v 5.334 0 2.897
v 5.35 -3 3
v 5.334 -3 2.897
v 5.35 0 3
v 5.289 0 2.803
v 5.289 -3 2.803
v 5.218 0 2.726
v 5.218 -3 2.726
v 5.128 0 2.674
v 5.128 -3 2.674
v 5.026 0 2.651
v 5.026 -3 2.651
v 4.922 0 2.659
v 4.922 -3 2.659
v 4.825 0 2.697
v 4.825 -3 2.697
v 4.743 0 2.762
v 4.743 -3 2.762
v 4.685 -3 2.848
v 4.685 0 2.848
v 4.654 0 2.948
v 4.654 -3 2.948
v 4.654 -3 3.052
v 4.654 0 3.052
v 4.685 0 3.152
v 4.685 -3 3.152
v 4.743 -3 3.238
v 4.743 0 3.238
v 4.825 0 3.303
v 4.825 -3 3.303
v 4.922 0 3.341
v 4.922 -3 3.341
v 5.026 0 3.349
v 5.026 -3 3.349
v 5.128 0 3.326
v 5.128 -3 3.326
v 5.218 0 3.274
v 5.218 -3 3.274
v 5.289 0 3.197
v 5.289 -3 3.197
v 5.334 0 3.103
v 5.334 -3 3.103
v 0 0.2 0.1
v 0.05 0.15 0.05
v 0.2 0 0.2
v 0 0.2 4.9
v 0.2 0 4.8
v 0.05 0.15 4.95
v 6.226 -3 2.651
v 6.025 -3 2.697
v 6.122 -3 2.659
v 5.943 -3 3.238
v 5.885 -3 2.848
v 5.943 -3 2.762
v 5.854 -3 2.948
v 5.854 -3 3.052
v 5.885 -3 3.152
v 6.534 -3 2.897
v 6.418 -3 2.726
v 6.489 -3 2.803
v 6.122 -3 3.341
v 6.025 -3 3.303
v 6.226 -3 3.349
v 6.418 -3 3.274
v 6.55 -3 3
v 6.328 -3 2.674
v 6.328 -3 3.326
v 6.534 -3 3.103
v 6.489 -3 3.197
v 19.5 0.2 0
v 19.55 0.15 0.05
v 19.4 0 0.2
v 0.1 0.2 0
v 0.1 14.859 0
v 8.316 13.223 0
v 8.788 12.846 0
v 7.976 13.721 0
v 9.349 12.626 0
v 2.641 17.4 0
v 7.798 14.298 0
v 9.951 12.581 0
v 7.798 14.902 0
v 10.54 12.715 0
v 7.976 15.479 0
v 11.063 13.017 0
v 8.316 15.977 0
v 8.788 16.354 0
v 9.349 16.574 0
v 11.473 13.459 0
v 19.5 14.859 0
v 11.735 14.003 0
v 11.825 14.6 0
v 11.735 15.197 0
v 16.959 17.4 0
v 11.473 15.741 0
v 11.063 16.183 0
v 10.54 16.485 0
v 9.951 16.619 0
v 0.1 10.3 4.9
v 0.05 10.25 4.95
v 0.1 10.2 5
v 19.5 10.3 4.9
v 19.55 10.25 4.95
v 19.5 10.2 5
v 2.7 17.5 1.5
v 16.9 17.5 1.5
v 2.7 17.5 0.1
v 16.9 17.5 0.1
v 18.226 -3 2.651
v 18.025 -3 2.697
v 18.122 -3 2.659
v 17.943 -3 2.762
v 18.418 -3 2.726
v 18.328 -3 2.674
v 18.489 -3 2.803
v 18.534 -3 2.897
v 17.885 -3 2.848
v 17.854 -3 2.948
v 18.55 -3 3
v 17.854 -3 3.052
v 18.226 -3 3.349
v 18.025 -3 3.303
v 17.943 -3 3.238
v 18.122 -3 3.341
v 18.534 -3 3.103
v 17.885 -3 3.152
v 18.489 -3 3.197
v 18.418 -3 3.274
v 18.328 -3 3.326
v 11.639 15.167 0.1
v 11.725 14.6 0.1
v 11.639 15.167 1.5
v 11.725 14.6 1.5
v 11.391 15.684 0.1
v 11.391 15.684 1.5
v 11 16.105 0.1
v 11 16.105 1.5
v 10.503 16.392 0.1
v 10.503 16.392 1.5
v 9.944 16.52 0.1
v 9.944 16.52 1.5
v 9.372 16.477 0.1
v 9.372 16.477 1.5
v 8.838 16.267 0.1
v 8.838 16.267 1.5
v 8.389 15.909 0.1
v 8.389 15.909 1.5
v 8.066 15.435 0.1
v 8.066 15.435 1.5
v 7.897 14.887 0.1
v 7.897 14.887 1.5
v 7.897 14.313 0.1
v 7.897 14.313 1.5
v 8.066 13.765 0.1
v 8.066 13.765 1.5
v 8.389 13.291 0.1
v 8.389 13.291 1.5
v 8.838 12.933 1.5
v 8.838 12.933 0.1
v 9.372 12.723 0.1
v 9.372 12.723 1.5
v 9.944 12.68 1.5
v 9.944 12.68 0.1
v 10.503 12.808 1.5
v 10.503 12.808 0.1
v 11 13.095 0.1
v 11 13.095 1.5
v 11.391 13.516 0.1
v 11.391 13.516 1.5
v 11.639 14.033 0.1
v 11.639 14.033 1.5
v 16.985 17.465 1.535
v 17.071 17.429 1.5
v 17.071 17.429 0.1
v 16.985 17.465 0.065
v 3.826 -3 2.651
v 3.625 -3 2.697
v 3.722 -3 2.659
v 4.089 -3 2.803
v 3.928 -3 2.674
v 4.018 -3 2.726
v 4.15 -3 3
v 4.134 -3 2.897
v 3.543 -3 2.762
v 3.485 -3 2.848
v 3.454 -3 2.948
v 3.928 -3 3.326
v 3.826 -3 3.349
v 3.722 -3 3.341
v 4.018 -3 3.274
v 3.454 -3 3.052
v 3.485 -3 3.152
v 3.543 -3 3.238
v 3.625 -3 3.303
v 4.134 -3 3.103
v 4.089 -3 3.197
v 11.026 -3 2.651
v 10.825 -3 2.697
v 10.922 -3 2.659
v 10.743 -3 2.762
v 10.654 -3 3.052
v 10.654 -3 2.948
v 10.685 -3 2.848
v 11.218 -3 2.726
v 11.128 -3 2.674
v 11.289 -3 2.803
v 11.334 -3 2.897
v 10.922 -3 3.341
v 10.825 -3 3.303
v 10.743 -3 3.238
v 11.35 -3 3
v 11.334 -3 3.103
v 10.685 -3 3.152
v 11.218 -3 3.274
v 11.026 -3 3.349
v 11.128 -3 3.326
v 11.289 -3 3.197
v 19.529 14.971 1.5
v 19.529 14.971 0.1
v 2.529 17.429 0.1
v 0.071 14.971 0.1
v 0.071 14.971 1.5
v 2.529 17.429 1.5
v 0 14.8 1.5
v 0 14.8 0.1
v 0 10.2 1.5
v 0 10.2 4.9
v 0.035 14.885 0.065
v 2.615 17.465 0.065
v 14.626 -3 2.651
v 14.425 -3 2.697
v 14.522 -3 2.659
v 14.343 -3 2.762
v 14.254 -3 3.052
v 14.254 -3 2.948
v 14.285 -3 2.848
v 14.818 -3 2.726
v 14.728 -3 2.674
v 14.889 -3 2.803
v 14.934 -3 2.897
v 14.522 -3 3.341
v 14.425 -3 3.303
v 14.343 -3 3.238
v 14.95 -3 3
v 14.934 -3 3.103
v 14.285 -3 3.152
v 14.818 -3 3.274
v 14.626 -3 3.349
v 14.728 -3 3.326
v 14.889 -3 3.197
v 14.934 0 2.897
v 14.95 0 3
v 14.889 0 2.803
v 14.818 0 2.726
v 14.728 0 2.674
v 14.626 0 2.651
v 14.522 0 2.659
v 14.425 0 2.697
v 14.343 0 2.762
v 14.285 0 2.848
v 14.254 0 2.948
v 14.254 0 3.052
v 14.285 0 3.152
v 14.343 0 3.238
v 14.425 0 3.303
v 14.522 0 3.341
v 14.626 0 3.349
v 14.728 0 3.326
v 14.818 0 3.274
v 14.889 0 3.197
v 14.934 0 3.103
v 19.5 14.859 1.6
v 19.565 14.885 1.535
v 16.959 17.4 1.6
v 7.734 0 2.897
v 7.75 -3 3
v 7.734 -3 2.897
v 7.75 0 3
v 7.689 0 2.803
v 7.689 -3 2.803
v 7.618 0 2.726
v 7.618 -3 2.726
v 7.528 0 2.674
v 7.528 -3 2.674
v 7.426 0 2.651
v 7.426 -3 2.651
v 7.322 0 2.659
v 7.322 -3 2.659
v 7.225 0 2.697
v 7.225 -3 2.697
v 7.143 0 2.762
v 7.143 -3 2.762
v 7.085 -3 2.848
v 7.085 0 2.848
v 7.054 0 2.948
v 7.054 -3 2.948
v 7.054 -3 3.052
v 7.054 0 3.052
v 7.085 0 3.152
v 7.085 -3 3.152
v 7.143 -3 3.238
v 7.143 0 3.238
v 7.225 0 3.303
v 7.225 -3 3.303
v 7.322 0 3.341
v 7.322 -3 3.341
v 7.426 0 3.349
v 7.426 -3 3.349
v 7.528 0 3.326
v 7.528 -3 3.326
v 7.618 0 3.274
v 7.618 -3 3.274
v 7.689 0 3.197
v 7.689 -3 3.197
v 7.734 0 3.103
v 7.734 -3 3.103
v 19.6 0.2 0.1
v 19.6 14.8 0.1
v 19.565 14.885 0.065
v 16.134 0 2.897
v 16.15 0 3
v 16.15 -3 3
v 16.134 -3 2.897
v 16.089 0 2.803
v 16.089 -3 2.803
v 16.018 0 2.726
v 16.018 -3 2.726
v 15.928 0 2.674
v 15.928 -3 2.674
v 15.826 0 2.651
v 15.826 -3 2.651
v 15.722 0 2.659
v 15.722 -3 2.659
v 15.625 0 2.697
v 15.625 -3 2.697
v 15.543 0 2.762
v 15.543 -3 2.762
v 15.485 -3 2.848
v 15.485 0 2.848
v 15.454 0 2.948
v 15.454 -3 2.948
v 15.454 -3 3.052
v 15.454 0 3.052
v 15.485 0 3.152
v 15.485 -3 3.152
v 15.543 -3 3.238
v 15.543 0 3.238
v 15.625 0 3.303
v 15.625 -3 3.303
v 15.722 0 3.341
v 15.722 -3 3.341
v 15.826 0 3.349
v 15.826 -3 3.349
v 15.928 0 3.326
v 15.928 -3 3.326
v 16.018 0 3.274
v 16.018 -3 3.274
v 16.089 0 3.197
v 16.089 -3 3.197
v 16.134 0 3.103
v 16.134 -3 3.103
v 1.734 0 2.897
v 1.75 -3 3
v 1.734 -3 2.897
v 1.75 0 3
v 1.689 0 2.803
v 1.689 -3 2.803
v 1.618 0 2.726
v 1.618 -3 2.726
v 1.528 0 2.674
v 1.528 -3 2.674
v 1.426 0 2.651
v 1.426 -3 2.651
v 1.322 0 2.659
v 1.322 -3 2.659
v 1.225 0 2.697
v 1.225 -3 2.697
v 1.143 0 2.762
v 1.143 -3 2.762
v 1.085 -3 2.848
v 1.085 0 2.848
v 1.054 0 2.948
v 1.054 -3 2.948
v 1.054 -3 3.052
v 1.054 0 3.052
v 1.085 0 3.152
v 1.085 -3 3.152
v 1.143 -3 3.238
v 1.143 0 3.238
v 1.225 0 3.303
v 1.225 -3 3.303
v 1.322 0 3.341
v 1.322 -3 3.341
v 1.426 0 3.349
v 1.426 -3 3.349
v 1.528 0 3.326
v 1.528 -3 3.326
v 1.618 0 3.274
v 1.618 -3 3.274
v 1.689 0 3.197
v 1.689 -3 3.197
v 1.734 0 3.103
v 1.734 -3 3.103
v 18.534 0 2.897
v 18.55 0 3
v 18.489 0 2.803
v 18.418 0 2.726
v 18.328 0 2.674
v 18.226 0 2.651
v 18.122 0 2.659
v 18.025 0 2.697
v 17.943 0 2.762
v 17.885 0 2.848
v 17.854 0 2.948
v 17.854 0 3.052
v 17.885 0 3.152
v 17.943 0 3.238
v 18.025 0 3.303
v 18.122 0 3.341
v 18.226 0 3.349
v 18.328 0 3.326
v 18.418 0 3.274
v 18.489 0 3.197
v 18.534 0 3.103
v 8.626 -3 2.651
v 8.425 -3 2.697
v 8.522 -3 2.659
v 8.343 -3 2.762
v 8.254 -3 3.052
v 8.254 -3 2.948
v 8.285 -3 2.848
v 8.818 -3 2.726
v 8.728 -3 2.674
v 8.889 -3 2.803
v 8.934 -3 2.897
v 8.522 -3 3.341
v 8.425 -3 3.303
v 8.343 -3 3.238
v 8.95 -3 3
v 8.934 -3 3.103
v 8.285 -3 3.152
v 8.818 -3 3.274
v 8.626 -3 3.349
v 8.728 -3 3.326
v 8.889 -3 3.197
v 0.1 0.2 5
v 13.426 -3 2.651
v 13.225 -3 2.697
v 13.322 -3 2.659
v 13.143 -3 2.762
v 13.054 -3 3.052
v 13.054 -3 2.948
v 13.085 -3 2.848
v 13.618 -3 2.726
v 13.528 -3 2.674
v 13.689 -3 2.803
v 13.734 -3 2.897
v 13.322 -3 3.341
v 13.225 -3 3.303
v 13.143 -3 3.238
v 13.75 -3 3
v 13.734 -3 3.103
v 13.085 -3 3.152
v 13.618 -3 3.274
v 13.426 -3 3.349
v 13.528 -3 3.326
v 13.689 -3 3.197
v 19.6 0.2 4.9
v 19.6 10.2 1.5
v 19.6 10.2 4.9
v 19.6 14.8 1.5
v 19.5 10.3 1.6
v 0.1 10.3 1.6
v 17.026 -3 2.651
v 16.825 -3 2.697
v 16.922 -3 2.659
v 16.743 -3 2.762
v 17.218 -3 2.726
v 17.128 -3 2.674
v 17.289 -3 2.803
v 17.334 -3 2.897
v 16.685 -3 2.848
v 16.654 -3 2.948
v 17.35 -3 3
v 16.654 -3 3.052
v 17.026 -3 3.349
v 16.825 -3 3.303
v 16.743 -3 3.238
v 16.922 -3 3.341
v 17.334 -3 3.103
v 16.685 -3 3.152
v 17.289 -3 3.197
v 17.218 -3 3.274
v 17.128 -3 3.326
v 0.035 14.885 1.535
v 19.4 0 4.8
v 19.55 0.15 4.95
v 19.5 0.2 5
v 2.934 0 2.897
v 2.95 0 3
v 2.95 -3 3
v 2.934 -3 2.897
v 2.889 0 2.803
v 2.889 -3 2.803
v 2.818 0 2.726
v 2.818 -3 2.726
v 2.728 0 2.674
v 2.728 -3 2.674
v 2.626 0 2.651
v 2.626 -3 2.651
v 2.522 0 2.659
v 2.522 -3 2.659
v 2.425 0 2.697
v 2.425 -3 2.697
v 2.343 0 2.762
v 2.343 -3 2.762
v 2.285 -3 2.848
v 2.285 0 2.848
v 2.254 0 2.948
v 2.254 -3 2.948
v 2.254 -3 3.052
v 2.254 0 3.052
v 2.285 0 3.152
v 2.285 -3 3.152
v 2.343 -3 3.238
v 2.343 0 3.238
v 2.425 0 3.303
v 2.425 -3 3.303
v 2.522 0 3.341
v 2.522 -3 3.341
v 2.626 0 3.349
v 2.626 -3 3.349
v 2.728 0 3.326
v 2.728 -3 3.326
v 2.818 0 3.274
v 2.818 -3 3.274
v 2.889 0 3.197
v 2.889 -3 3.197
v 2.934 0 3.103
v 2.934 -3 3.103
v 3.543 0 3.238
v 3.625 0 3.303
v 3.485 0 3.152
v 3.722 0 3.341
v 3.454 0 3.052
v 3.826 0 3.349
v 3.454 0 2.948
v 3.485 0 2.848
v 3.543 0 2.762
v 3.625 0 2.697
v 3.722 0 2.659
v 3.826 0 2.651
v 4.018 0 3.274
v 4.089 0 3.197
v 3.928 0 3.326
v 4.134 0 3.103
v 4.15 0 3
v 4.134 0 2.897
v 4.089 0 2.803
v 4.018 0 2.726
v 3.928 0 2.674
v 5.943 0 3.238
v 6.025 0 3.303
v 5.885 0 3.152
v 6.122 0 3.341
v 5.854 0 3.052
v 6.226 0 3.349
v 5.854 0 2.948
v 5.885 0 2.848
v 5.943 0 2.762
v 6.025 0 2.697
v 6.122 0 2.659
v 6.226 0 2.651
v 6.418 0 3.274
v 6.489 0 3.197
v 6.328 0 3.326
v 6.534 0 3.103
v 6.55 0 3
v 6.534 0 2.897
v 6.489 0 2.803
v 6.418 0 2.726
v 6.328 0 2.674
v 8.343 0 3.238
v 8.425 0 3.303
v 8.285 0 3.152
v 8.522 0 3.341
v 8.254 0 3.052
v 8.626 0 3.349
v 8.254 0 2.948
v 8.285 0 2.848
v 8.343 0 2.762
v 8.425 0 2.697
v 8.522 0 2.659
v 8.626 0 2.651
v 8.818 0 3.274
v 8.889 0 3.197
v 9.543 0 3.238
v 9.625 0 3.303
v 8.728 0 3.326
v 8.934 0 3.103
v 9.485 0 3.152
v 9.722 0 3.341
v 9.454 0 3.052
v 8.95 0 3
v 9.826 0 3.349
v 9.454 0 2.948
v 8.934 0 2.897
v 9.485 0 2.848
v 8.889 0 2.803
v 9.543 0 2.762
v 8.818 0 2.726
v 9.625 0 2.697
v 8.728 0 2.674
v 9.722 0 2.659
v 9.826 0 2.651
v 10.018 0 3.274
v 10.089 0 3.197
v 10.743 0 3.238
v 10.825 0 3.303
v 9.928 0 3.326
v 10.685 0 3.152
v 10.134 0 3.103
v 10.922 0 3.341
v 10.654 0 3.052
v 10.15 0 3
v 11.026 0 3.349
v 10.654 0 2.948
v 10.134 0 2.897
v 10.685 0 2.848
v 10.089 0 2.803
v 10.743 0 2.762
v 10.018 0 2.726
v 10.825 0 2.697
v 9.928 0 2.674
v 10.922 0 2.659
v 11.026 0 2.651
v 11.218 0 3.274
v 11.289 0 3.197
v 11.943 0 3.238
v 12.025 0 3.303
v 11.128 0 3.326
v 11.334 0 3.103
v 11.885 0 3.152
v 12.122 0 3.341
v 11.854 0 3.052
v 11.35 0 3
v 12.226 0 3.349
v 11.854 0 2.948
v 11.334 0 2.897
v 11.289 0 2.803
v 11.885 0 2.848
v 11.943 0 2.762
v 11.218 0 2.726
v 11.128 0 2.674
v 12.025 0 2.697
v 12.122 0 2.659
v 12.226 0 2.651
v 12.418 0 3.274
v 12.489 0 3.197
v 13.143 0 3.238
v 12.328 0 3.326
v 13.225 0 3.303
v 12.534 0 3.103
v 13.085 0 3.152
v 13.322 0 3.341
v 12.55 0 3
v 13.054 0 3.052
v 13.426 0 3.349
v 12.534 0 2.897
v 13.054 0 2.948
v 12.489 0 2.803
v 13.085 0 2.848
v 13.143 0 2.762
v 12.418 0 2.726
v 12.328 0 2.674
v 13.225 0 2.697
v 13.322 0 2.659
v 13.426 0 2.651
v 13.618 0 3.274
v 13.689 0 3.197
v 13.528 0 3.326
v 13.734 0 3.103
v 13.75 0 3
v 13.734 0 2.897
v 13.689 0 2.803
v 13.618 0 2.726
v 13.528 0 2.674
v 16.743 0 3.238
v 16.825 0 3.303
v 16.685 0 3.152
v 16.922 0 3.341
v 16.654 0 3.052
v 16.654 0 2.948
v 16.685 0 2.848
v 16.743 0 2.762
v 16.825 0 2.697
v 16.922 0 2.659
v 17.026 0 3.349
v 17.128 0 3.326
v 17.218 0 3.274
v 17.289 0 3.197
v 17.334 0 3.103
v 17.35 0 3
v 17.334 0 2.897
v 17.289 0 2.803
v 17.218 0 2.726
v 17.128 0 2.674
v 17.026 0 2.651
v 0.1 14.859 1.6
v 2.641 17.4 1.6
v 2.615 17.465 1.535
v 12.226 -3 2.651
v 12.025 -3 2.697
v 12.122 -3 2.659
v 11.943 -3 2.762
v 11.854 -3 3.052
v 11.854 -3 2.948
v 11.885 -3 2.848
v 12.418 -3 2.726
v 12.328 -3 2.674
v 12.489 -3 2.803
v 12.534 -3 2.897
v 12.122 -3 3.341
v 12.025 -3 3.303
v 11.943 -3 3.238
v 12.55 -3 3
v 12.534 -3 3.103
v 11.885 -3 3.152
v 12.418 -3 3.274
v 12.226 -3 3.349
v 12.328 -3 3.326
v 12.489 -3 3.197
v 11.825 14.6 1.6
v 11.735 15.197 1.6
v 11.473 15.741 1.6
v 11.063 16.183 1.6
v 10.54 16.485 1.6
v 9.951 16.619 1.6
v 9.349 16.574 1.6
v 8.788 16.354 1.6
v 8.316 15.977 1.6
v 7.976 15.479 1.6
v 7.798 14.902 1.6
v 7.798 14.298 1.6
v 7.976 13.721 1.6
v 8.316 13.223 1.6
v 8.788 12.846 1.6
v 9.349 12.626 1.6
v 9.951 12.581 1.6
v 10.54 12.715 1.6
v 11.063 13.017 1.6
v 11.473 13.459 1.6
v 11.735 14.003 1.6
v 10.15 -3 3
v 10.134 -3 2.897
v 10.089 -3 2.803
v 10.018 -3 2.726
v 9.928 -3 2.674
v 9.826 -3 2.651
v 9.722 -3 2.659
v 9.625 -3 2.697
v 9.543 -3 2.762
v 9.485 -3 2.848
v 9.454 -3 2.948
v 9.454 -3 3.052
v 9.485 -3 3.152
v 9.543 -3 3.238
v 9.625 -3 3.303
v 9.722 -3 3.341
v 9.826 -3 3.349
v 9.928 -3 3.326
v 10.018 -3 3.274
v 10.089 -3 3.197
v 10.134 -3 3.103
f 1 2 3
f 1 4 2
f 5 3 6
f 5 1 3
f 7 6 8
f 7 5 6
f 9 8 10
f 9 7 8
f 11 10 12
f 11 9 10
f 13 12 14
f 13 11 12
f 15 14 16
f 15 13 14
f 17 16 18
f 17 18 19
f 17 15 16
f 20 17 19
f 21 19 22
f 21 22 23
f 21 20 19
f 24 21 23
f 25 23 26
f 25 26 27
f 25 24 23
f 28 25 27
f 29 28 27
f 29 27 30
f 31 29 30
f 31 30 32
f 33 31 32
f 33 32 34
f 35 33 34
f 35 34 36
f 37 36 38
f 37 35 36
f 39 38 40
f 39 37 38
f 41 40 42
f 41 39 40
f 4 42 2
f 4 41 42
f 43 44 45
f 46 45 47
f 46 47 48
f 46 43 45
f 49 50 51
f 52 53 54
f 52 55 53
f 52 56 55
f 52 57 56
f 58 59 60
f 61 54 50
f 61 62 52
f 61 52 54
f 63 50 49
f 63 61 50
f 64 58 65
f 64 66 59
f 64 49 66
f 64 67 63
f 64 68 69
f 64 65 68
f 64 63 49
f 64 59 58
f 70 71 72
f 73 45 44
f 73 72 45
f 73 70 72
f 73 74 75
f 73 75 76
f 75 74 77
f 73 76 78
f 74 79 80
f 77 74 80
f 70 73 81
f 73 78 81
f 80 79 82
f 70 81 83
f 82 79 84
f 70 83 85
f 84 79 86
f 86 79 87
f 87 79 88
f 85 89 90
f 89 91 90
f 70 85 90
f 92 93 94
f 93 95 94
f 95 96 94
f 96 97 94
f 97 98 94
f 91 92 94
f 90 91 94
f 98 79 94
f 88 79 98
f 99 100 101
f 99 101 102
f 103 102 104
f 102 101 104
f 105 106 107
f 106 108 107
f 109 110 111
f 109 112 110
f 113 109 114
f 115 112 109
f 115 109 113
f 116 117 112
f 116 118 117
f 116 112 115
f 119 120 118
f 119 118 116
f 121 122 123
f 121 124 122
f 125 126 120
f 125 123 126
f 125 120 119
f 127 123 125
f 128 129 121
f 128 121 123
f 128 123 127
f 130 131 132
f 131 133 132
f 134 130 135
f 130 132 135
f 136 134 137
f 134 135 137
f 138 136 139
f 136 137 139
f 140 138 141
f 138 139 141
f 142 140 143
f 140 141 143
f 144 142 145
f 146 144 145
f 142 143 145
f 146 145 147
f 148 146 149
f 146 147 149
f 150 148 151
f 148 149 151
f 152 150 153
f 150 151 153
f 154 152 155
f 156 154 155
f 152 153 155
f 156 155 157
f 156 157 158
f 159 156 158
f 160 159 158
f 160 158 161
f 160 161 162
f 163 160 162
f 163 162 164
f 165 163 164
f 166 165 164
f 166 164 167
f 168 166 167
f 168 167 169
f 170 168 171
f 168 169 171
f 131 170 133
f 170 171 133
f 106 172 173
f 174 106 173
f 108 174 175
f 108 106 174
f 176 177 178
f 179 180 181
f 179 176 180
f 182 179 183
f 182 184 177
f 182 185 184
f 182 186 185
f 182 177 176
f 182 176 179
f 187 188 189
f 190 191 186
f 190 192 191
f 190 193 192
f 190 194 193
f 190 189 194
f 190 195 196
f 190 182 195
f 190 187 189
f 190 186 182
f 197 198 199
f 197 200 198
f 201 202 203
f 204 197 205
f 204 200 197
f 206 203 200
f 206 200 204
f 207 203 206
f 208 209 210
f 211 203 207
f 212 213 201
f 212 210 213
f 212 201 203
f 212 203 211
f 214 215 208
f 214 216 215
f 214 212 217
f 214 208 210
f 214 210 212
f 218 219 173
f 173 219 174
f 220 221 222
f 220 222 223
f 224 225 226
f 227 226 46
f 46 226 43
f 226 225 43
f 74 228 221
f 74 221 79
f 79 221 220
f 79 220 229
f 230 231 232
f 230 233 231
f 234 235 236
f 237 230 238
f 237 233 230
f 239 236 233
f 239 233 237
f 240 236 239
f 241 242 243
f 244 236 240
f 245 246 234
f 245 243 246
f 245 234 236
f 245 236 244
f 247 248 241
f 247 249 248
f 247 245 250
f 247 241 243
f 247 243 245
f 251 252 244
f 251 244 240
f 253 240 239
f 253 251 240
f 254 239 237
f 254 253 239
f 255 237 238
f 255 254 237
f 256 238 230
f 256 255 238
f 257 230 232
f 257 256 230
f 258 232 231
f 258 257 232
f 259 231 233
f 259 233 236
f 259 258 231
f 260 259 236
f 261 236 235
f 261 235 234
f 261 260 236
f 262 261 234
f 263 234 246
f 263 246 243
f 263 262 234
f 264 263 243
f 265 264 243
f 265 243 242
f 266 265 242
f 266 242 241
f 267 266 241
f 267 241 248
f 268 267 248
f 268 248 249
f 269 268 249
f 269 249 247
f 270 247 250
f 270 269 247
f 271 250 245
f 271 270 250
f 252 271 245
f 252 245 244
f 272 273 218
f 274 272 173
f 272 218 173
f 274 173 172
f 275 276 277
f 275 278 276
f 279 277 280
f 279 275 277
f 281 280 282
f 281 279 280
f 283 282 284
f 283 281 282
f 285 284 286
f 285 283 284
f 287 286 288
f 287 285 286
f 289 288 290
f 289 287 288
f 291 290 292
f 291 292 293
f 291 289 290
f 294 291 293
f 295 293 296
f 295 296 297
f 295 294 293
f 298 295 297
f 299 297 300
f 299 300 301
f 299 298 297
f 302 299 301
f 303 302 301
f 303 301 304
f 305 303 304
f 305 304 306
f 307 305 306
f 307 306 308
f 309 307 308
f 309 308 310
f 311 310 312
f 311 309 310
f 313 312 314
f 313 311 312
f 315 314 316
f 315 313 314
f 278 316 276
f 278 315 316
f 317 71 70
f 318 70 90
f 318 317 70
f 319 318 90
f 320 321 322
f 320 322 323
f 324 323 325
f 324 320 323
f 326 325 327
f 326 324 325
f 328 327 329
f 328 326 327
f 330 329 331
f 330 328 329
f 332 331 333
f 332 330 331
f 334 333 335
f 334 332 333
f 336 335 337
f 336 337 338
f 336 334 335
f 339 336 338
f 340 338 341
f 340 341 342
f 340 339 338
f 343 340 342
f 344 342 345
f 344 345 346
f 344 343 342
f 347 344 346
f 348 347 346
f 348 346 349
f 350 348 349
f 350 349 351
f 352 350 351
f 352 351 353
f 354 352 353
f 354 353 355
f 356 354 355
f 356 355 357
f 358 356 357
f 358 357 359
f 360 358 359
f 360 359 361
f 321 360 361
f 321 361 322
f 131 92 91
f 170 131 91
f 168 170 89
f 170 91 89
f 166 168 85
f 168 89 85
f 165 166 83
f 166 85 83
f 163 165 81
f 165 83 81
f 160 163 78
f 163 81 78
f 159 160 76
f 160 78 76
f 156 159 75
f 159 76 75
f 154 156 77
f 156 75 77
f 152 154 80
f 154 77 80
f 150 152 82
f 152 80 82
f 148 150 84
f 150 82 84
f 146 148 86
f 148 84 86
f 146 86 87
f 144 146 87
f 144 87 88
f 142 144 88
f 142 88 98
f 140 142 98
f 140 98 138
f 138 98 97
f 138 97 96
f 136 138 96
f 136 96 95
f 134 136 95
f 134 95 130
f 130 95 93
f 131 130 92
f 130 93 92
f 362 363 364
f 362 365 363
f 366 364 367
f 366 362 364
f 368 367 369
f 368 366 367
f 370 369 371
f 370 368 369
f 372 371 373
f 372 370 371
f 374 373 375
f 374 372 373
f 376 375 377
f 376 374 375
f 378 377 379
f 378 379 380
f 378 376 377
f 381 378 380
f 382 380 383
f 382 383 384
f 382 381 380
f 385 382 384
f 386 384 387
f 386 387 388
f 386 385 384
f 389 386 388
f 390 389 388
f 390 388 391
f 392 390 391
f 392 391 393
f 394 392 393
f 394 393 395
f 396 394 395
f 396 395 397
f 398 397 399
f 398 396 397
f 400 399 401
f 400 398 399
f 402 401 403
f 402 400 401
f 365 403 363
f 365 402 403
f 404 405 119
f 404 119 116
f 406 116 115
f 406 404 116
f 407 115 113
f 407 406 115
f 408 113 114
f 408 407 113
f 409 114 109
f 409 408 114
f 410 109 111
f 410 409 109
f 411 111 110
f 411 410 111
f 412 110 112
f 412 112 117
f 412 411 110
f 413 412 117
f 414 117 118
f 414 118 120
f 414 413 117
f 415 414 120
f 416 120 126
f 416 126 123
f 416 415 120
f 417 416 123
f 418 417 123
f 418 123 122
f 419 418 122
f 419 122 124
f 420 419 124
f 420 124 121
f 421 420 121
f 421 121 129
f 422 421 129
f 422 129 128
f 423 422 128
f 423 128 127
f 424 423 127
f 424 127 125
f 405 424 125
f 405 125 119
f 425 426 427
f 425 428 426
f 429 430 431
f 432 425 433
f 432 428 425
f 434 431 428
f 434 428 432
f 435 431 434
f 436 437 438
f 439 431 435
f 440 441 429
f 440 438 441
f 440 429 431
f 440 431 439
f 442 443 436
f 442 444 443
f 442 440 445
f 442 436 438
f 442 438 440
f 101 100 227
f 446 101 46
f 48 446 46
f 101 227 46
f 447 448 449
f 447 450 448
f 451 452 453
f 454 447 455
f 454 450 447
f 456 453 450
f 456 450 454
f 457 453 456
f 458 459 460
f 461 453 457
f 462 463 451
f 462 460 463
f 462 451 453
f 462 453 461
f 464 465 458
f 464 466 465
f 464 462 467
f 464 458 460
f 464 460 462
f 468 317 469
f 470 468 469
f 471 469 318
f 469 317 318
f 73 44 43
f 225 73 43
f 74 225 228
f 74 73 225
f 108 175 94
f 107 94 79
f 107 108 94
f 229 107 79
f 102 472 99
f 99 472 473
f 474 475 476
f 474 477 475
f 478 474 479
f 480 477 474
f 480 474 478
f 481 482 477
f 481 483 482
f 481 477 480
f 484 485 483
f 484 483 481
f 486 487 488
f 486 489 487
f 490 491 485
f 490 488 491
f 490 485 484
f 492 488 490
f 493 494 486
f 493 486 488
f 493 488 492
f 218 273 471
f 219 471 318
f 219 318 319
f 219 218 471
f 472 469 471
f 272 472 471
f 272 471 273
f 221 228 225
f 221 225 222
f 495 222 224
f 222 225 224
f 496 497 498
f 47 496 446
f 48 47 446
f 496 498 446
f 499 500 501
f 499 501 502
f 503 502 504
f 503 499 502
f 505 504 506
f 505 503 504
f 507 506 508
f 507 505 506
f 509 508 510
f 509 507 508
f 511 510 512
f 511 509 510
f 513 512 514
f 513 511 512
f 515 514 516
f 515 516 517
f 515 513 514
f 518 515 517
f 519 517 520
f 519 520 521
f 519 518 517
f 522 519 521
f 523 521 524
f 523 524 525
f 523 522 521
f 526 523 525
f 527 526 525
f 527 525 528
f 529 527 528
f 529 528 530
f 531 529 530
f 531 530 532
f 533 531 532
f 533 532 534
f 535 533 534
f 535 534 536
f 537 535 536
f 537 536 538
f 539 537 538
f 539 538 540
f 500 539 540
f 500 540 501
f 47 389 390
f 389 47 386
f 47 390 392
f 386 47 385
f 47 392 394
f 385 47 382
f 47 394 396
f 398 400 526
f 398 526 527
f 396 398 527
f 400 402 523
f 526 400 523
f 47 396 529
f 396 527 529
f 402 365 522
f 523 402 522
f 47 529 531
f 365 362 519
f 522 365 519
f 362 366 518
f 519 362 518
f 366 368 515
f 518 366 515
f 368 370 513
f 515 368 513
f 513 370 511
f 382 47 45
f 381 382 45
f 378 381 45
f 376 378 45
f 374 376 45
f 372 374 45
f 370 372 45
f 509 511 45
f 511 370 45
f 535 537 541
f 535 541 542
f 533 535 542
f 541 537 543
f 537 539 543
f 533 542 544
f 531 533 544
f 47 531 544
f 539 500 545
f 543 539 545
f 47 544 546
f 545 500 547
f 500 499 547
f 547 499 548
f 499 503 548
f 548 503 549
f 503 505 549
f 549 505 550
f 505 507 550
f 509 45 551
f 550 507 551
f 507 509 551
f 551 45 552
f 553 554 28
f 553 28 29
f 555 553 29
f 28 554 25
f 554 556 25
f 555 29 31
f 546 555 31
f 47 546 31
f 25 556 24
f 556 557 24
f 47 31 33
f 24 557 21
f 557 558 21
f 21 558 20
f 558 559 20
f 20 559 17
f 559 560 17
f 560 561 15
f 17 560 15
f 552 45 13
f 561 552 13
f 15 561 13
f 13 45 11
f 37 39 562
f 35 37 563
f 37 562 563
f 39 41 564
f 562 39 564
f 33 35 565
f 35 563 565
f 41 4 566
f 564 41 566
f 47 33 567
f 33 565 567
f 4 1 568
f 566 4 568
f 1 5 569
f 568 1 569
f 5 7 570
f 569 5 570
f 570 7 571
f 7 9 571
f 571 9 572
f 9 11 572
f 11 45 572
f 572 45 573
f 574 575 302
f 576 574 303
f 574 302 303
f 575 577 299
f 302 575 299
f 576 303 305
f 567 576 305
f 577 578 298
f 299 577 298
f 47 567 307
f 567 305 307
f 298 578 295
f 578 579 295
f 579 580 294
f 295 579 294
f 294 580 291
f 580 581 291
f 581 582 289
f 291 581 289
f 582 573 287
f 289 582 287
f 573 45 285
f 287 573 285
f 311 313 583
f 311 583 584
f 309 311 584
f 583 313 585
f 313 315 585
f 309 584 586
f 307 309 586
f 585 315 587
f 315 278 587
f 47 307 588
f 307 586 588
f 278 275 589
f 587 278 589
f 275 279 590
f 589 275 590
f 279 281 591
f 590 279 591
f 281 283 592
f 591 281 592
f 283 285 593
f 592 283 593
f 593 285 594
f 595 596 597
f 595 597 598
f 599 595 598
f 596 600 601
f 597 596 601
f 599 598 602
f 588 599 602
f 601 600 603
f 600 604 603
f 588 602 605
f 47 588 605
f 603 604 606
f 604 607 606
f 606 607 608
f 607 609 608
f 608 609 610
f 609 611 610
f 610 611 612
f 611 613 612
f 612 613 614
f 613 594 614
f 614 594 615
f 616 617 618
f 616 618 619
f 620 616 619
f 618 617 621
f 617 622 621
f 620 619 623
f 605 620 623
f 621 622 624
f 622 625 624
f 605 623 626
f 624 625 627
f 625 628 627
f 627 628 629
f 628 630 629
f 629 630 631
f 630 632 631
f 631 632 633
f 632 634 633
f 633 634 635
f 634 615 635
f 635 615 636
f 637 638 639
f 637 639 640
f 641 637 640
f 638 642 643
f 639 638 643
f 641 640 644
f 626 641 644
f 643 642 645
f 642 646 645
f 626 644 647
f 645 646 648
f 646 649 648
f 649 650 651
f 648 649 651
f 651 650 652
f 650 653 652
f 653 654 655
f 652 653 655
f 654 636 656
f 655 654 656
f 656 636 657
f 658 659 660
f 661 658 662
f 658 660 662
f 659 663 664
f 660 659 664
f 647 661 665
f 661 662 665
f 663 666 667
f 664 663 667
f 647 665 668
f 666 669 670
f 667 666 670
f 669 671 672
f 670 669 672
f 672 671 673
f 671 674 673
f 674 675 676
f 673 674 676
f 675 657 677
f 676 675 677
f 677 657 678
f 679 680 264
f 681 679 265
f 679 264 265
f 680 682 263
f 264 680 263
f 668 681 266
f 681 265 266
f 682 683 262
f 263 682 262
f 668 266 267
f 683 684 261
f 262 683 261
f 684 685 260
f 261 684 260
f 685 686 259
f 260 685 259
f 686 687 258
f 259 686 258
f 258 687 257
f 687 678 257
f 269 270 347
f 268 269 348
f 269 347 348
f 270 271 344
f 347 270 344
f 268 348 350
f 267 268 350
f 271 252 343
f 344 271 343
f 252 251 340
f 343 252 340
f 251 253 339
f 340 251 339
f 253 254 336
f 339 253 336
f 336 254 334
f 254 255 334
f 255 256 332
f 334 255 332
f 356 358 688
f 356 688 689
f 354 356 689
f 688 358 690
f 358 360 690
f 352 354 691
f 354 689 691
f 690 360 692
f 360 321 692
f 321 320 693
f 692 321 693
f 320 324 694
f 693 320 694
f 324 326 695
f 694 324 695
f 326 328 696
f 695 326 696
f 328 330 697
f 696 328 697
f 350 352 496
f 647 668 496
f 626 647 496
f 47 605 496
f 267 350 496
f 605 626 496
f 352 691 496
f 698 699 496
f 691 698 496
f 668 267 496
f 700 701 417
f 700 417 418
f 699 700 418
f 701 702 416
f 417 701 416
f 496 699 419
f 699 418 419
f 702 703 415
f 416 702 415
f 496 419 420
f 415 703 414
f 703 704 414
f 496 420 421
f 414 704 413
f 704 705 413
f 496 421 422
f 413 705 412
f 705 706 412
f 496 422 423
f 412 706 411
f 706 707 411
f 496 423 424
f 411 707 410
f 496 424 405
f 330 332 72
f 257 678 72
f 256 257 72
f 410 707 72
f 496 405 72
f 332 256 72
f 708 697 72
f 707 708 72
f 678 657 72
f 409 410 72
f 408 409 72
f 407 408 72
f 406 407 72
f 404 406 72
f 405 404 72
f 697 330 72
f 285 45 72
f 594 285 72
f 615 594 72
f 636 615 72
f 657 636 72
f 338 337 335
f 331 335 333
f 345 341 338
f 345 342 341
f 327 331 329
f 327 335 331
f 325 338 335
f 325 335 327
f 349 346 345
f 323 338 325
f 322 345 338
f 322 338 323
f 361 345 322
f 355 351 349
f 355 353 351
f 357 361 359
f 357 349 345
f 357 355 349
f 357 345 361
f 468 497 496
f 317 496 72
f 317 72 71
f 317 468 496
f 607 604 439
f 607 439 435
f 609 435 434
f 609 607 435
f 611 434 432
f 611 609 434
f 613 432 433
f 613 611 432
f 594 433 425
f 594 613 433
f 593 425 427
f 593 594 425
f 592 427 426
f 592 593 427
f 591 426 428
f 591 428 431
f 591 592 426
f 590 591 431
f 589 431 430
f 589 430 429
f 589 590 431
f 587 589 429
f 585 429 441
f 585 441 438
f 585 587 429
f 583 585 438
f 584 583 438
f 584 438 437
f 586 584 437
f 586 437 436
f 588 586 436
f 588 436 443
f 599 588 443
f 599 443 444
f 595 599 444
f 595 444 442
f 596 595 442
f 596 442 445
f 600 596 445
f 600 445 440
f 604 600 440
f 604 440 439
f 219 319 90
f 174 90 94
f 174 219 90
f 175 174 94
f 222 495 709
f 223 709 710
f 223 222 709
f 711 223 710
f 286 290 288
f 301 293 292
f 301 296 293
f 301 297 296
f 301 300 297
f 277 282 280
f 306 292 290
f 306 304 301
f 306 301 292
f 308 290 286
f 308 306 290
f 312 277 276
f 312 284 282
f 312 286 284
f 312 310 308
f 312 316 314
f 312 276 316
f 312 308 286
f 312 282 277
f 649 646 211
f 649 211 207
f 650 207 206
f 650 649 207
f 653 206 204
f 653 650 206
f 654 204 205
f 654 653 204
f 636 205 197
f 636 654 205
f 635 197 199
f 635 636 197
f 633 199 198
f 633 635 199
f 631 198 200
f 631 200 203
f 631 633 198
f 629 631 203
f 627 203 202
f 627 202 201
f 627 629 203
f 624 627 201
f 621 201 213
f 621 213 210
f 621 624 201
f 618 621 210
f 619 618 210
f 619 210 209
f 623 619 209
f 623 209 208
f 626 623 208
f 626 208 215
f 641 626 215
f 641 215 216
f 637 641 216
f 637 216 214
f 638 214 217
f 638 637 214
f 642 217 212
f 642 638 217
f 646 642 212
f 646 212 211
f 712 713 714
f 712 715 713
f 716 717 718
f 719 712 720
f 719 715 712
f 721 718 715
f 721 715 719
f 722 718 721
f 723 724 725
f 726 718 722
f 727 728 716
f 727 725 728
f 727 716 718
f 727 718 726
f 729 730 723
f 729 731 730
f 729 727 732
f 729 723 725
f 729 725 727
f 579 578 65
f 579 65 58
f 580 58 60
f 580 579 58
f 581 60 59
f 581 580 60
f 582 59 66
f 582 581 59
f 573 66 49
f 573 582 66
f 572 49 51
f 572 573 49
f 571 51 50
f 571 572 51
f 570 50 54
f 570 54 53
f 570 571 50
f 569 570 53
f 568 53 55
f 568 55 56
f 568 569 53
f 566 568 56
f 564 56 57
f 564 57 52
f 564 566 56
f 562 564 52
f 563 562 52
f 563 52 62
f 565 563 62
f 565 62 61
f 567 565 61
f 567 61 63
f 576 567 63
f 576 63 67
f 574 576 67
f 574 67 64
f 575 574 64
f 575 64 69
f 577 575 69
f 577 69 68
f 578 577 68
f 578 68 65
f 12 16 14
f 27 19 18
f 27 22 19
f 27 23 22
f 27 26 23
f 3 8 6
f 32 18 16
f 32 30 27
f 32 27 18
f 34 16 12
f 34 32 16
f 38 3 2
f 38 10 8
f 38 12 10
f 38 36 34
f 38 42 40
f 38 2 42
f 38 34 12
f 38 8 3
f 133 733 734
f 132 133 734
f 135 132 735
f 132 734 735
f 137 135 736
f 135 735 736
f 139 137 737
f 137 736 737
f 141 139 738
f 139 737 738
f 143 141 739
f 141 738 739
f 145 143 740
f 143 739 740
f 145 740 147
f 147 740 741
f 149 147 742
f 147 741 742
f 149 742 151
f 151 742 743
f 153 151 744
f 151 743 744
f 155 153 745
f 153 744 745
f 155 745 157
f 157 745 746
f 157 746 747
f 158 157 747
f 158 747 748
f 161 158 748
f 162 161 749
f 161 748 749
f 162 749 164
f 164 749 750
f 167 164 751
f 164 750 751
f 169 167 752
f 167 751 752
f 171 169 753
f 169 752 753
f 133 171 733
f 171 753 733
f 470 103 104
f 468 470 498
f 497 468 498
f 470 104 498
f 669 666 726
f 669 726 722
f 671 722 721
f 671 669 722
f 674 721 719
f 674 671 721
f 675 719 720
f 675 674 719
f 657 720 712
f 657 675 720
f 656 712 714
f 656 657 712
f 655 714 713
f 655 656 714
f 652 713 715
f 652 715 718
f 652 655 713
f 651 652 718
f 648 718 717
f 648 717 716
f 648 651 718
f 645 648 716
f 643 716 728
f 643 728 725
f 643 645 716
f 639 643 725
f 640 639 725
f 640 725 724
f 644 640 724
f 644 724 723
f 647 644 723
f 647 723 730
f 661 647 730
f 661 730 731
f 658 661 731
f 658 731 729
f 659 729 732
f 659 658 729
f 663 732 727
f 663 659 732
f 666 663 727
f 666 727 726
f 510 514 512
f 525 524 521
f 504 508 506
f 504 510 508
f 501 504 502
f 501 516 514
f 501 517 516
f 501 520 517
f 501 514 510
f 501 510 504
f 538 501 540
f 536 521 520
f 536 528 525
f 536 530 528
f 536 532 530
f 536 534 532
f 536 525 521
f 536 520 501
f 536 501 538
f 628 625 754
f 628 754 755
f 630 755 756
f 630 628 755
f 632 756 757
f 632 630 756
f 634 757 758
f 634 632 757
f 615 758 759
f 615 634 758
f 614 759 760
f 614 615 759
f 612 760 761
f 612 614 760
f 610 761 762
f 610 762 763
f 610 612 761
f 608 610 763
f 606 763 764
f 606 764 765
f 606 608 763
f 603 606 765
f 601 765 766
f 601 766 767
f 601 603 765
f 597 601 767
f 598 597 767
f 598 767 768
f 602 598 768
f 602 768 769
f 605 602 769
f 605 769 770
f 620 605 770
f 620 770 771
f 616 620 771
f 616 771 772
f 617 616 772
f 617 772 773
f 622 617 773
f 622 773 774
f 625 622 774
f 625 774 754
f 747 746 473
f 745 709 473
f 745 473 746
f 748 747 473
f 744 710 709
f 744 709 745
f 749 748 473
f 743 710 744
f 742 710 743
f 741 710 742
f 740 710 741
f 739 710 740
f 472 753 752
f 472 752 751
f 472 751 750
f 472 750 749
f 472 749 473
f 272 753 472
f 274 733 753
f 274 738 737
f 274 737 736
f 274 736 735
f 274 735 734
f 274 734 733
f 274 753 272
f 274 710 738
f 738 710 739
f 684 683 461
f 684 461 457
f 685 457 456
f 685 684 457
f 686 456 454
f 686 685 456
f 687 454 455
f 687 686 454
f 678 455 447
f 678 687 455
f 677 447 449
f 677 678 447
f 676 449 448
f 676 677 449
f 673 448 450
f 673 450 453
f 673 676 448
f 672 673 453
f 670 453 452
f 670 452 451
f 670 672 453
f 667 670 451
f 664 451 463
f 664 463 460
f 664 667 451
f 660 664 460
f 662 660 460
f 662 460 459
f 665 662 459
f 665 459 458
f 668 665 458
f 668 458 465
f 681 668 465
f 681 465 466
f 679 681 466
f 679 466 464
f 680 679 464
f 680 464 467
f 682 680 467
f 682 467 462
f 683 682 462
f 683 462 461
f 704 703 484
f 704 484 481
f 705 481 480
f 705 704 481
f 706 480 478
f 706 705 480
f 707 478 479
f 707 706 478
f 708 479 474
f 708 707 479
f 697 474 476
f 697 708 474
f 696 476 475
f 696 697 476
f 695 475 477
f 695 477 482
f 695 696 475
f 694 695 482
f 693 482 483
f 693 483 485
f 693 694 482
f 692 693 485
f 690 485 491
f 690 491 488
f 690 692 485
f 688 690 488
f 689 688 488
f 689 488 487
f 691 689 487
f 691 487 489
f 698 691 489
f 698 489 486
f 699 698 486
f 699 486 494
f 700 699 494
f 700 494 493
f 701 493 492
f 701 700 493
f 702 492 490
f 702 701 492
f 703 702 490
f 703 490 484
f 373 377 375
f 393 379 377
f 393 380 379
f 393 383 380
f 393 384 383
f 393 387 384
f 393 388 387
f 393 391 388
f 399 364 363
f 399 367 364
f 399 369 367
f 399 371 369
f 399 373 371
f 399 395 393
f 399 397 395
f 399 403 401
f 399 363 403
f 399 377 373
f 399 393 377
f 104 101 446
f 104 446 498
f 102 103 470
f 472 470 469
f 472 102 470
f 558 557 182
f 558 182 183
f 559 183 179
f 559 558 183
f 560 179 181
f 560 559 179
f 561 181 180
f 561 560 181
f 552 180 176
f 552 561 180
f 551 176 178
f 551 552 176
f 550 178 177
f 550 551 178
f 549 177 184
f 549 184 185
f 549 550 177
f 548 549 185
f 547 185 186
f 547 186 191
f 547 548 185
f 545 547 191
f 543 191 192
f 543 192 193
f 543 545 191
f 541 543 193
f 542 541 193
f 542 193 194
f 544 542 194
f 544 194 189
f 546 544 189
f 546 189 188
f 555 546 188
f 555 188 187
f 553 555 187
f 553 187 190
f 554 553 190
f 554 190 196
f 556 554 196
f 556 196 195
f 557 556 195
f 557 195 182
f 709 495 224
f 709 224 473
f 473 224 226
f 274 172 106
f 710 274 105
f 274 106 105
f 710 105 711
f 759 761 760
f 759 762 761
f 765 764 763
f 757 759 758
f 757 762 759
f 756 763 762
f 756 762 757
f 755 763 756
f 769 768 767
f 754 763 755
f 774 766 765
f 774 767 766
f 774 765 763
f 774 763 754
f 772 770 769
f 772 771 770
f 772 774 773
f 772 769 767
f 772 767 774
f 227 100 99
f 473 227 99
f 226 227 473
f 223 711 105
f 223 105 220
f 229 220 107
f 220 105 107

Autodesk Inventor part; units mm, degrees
ref_plane "YZ Plane" through (0, 0, 0) normal (1, 0, 0) x (0, 1, 0)
ref_plane "XZ Plane" through (0, 0, 0) normal (0, 1, 0) x (-1, 0, 0)
ref_plane "XY Plane" through (0, 0, 0) normal (0, 0, 1) x (1, 0, 0)
sketch "Эскиз1" plane through (0, 0, 0) normal (0, 0, 1) x (1, 0, 0)
  line L0 (0, 0) -> (19.6, 0)
  line L1 (19.6, 0) -> (19.6, 17.5)
  line L2 (19.6, 17.5) -> (0, 17.5)
  line L3 (0, 17.5) -> (0, 0)
  line L4 (0, 0) -> (0, 10.7)
  line L5 (0, 10.7) -> (19.6, 10.7)
  line L6 (19.6, 17.5) -> (17, 17.5)
  line L7 (19.6, 17.5) -> (19.6, 14.9)
  line L8 (19.6, 14.9) -> (17, 17.5)
  line L9 (0, 17.5) -> (2.6, 17.5)
  line L10 (0, 17.5) -> (0, 14.9)
  line L11 (0, 14.9) -> (2.6, 17.5)
  dimension "d0" = 19.6
  dimension "d1" = 17.5
  dimension "d2" = 10.7
  dimension "d3" = 2.6
  dimension "d4" = 2.6
  dimension "d5" = 2.6
  dimension "d6" = 2.6
extrude "Выдавливание1" add sketch "Эскиз1" along normal blind 1.6 contours L3 L5 L1 L0 | L3 L11 L2 L8 L1 L5
sketch "Эскиз2" plane through (0, 0, 1.6) normal (0, 0, 1) x (1, 0, 0)
  line L0 (2.6, 17.5) -> (0, 14.9) projected
  line L1 (19.6, 0) -> (19.6, 14.9) projected
  line L2 (0, 14.9) -> (19.6, 14.9)
  line L3 (19.6, 14.9) -> (9.8, 14.9)
  line L4 (17, 17.5) -> (2.6, 17.5) projected
  line L5 (9.8, 17.5) -> (9.8, 14.6)
  circle A0 centre (9.8, 14.6) radius 1.925
  point P0 (0, 0)
  dimension "d9" = 2.9
  dimension "d10" = 3.85
extrude "Выдавливание2" cut sketch "Эскиз2" against normal blind 1.6 contours A0 L5 L2 | L2 A0 | A0 L2 L5
sketch "Эскиз3" plane through (0, 0, 1.6) normal (0, 0, 1) x (1, 0, 0)
  line L0 (0, 14.9) -> (0, 0) projected
  line L1 (0, 0) -> (0, 10.3)
  line L2 (0, 0) -> (19.6, 0) projected
  line L3 (19.6, 0) -> (19.6, 10.3)
  line L4 (19.6, 0) -> (19.6, 14.9) projected
  line L5 (19.6, 10.3) -> (0, 10.3)
  dimension "d13" = 10.3
  dimension "d14" = 10.3
extrude "Выдавливание3" add sketch "Эскиз3" along normal blind 3.4
chamfer "Фаска1" distance 0.1 angle 45 1 edges at (9.8, 10.3, 5)
chamfer "Фаска2" distance 0.1 angle 45 16 edges at (19.6, 5.1, 5) (0, 5.1, 5) (9.8, 17.5, 1.6) (18.3, 16.2, 1.6) (19.6, 12.6, 1.6) (0, 12.6, 1.6) (1.3, 16.2, 1.6) (19.6, 14.9, 0.8) (17, 17.5, 0.8) (7.875, 14.6, 1.6) (7.875, 14.6, 0) (9.8, 17.5, 0) (18.3, 16.2, 0) (19.6, 7.45, 0) (19.6, 10.3, 3.25) (0, 10.3, 3.25)
chamfer "Фаска3" distance 0.2 angle 45 1 edges at (9.75, 0, 0)
chamfer "Фаска4" distance 0.2 angle 45 3 edges at (19.6, 0, 2.55) (0, 0, 2.55) (9.8, 0, 5)
chamfer "Фаска5" distance 0.1 angle 45 4 edges at (0, 7.55, 0) (1.25, 16.15, 0) (2.6, 17.5, 0.8) (0, 14.9, 0.75)
sketch "Эскиз4" plane through (0.2, 0, 4.8) normal (0, -1, 0) x (1, 0, 0)
  line L0 (0, -4.6) -> (0, 0) projected
  line L1 (19.2, 0) -> (19.2, -4.6) projected
  line L2 (0, 0) -> (19.2, 0)
  line L3 (19.2, 0) -> (19.2, -3.6)
  line L4 (19.2, -3.6) -> (0, -3.6)
  line L5 (0, -3.6) -> (0, 0)
  line L6 (-0.15, 0.15) -> (0, 0) projected
  line L7 (9.6, -1.8) -> (0, -1.8)
  line L8 (9.6, -1.8) -> (19.2, -1.8)
  line L9 (0, 0) -> (19.2, 0) projected
  line L10 (0, -3.6) -> (19.2, 0)
  line L11 (0, 0) -> (19.2, -3.6)
  line L12 (9.6, -1.8) -> (9.6, 0)
  line L13 (9.6, 0) -> (0, -3.6)
  line L14 (0, 0) -> (9.6, -3.6)
  line L15 (9.6, -3.6) -> (19.2, 0)
  line L16 (9.6, 0) -> (19.2, -3.6)
  line L17 (4.8, -1.8) -> (4.8, 0)
  line L18 (4.8, 0) -> (0, -3.6)
  line L19 (0, 0) -> (4.8, -3.6)
  line L20 (4.8, -3.6) -> (9.6, 0)
  line L21 (4.8, 0) -> (9.6, -3.6)
  line L22 (14.4, -1.8) -> (14.4, 0)
  line L23 (14.4, 0) -> (9.6, -3.6)
  line L24 (9.6, 0) -> (14.4, -3.6)
  line L25 (14.4, -3.6) -> (19.2, 0)
  line L26 (14.4, 0) -> (19.2, -3.6)
  line L27 (16.8, -1.8) -> (16.8, 0)
  line L28 (19.2, 0) -> (16.8, -3.6)
  line L29 (16.8, 0) -> (19.2, -3.6)
  line L30 (16.8, 0) -> (14.4, -3.6)
  line L31 (14.4, 0) -> (16.8, -3.6)
  line L32 (12, -1.8) -> (12, 0)
  line L33 (14.4, 0) -> (12, -3.6)
  line L34 (12, 0) -> (14.4, -3.6)
  line L35 (12, 0) -> (9.6, -3.6)
  line L36 (9.6, 0) -> (12, -3.6)
  line L37 (9.6, 0) -> (7.2, -3.6)
  line L38 (7.2, 0) -> (9.6, -3.6)
  line L39 (7.2, 0) -> (4.8, -3.6)
  line L40 (4.8, 0) -> (7.2, -3.6)
  line L41 (2.4, -1.8) -> (2.4, 0)
  line L42 (4.8, 0) -> (2.4, -3.6)
  line L43 (2.4, 0) -> (4.8, -3.6)
  line L44 (2.4, 0) -> (0, -3.6)
  line L45 (0, 0) -> (2.4, -3.6)
  circle A0 centre (1.2, -1.8) radius 0.35
  circle A1 centre (2.4, -1.8) radius 0.35
  circle A2 centre (3.6, -1.8) radius 0.35
  circle A3 centre (4.8, -1.8) radius 0.35
  circle A4 centre (6, -1.8) radius 0.35
  circle A5 centre (7.2, -1.8) radius 0.35
  circle A6 centre (8.4, -1.8) radius 0.35
  circle A7 centre (9.6, -1.8) radius 0.35
  circle A8 centre (10.8, -1.8) radius 0.35
  circle A9 centre (12, -1.8) radius 0.35
  circle A10 centre (13.2, -1.8) radius 0.35
  circle A11 centre (14.4, -1.8) radius 0.35
  circle A12 centre (15.6, -1.8) radius 0.35
  circle A13 centre (16.8, -1.8) radius 0.35
  circle A14 centre (18, -1.8) radius 0.35
  point P0 (-0.2, -4.8)
  dimension "d32" = 3.6
  dimension "d33" = 0.7
  dimension "d34" = 0.7
  dimension "d35" = 0.7
  dimension "d36" = 0.7
  dimension "d37" = 0.7
  dimension "d38" = 0.7
  dimension "d39" = 0.7
  dimension "d40" = 0.7
  dimension "d41" = 0.7
  dimension "d42" = 0.7
  dimension "d43" = 0.7
  dimension "d44" = 0.7
  dimension "d45" = 0.7
  dimension "d46" = 0.7
  dimension "d47" = 0.7
extrude "Выдавливание4" add sketch "Эскиз4" along normal blind 3 contours A0 L7 L44 | L44 L45 A0 | A0 L45 L7 | A1 L7 L18 | L18 L19 A1 | L45 L7 A0 | L44 A0 L7 | L45 A0 L44 | L19 L7 A1 | A2 L7 L42 | L42 L43 A2 | L18 A1 L7 | L41 A1 L18 | L7 A1 L19 | L19 A1 L41 | A5 L7 L20 | L20 L21 A5 | A4 L39 L40 | L40 L7 A4 | A3 L7 L13 | L13 L14 A3 | L43 L7 A2 | L42 A2 L7 | L43 A2 L42 | L7 A2 L43 | A8 L11 L35 | L35 L11 L36 A8 | A6 L37 L10 L38 | L38 L10 A6 | A6 L7 L37 L10 | L10 L37 A6 | L21 L7 A5 | L14 L7 A3 | A4 L7 L39 | L20 A5 L7 | L21 A5 L20 | L7 A5 L21 | L39 A4 L7 | L40 A4 L39 | L7 A4 L40 | L13 A3 L7 | L17 A3 L13 | L7 A3 L14 | L14 A3 L17 | L36 L11 A8 | L35 L36 L11 | L11 A8 L8 L35 | L38 L7 A6 L10 | L10 L37 L38 | A6 L11 L38 L7 | A7 L10 L12 | L12 L11 A7 | A8 L35 L10 L36 | L36 L10 A8 | A6 L11 L37 | L37 L11 L38 A6 | A6 L38 L11 | A9 L23 L24 | L24 L8 A9 | A10 L8 L33 | L33 L34 A10 | L11 L36 L8 A8 | A9 L8 L23 | L35 L10 A8 L8 | L36 L10 L35 | L8 A8 L10 L36 | A7 L10 L11 | L11 L8 A7 | L37 L11 A6 L7 | L38 L11 L37 | A7 L7 L10 | L10 A7 L8 | L7 A7 L11 | A8 L10 L35 | A11 L8 L15 | L15 L16 A11 | L34 L8 A10 | L23 A9 L8 | L32 A9 L23 | L8 A9 L24 | L24 A9 L32 | L33 A10 L8 | L34 A10 L33 | L8 A10 L34 | A14 L28 L29 | L29 L8 A14 | A13 L8 L25 | L25 L26 A13 | A12 L30 L31 | L31 L8 A12 | L16 L8 A11 | A12 L8 L30 | L15 A11 L8 | L22 A11 L15 | L8 A11 L16 | L16 A11 L22 | L8 L28 A14 | L26 L8 A13 | A14 L8 L28 | L29 A14 L28 | L8 A14 L29 | L25 A13 L8 | L27 A13 L25 | L8 A13 L26 | L26 A13 L27 | L30 A12 L8 | L31 A12 L30 | L8 A12 L31
sketch "Эскиз5" plane through (1.4, -3, 3) normal (0, -1, 0) x (1, 0, 0)
  point P0 (-1.4, -3)
properties part number "l298n"
